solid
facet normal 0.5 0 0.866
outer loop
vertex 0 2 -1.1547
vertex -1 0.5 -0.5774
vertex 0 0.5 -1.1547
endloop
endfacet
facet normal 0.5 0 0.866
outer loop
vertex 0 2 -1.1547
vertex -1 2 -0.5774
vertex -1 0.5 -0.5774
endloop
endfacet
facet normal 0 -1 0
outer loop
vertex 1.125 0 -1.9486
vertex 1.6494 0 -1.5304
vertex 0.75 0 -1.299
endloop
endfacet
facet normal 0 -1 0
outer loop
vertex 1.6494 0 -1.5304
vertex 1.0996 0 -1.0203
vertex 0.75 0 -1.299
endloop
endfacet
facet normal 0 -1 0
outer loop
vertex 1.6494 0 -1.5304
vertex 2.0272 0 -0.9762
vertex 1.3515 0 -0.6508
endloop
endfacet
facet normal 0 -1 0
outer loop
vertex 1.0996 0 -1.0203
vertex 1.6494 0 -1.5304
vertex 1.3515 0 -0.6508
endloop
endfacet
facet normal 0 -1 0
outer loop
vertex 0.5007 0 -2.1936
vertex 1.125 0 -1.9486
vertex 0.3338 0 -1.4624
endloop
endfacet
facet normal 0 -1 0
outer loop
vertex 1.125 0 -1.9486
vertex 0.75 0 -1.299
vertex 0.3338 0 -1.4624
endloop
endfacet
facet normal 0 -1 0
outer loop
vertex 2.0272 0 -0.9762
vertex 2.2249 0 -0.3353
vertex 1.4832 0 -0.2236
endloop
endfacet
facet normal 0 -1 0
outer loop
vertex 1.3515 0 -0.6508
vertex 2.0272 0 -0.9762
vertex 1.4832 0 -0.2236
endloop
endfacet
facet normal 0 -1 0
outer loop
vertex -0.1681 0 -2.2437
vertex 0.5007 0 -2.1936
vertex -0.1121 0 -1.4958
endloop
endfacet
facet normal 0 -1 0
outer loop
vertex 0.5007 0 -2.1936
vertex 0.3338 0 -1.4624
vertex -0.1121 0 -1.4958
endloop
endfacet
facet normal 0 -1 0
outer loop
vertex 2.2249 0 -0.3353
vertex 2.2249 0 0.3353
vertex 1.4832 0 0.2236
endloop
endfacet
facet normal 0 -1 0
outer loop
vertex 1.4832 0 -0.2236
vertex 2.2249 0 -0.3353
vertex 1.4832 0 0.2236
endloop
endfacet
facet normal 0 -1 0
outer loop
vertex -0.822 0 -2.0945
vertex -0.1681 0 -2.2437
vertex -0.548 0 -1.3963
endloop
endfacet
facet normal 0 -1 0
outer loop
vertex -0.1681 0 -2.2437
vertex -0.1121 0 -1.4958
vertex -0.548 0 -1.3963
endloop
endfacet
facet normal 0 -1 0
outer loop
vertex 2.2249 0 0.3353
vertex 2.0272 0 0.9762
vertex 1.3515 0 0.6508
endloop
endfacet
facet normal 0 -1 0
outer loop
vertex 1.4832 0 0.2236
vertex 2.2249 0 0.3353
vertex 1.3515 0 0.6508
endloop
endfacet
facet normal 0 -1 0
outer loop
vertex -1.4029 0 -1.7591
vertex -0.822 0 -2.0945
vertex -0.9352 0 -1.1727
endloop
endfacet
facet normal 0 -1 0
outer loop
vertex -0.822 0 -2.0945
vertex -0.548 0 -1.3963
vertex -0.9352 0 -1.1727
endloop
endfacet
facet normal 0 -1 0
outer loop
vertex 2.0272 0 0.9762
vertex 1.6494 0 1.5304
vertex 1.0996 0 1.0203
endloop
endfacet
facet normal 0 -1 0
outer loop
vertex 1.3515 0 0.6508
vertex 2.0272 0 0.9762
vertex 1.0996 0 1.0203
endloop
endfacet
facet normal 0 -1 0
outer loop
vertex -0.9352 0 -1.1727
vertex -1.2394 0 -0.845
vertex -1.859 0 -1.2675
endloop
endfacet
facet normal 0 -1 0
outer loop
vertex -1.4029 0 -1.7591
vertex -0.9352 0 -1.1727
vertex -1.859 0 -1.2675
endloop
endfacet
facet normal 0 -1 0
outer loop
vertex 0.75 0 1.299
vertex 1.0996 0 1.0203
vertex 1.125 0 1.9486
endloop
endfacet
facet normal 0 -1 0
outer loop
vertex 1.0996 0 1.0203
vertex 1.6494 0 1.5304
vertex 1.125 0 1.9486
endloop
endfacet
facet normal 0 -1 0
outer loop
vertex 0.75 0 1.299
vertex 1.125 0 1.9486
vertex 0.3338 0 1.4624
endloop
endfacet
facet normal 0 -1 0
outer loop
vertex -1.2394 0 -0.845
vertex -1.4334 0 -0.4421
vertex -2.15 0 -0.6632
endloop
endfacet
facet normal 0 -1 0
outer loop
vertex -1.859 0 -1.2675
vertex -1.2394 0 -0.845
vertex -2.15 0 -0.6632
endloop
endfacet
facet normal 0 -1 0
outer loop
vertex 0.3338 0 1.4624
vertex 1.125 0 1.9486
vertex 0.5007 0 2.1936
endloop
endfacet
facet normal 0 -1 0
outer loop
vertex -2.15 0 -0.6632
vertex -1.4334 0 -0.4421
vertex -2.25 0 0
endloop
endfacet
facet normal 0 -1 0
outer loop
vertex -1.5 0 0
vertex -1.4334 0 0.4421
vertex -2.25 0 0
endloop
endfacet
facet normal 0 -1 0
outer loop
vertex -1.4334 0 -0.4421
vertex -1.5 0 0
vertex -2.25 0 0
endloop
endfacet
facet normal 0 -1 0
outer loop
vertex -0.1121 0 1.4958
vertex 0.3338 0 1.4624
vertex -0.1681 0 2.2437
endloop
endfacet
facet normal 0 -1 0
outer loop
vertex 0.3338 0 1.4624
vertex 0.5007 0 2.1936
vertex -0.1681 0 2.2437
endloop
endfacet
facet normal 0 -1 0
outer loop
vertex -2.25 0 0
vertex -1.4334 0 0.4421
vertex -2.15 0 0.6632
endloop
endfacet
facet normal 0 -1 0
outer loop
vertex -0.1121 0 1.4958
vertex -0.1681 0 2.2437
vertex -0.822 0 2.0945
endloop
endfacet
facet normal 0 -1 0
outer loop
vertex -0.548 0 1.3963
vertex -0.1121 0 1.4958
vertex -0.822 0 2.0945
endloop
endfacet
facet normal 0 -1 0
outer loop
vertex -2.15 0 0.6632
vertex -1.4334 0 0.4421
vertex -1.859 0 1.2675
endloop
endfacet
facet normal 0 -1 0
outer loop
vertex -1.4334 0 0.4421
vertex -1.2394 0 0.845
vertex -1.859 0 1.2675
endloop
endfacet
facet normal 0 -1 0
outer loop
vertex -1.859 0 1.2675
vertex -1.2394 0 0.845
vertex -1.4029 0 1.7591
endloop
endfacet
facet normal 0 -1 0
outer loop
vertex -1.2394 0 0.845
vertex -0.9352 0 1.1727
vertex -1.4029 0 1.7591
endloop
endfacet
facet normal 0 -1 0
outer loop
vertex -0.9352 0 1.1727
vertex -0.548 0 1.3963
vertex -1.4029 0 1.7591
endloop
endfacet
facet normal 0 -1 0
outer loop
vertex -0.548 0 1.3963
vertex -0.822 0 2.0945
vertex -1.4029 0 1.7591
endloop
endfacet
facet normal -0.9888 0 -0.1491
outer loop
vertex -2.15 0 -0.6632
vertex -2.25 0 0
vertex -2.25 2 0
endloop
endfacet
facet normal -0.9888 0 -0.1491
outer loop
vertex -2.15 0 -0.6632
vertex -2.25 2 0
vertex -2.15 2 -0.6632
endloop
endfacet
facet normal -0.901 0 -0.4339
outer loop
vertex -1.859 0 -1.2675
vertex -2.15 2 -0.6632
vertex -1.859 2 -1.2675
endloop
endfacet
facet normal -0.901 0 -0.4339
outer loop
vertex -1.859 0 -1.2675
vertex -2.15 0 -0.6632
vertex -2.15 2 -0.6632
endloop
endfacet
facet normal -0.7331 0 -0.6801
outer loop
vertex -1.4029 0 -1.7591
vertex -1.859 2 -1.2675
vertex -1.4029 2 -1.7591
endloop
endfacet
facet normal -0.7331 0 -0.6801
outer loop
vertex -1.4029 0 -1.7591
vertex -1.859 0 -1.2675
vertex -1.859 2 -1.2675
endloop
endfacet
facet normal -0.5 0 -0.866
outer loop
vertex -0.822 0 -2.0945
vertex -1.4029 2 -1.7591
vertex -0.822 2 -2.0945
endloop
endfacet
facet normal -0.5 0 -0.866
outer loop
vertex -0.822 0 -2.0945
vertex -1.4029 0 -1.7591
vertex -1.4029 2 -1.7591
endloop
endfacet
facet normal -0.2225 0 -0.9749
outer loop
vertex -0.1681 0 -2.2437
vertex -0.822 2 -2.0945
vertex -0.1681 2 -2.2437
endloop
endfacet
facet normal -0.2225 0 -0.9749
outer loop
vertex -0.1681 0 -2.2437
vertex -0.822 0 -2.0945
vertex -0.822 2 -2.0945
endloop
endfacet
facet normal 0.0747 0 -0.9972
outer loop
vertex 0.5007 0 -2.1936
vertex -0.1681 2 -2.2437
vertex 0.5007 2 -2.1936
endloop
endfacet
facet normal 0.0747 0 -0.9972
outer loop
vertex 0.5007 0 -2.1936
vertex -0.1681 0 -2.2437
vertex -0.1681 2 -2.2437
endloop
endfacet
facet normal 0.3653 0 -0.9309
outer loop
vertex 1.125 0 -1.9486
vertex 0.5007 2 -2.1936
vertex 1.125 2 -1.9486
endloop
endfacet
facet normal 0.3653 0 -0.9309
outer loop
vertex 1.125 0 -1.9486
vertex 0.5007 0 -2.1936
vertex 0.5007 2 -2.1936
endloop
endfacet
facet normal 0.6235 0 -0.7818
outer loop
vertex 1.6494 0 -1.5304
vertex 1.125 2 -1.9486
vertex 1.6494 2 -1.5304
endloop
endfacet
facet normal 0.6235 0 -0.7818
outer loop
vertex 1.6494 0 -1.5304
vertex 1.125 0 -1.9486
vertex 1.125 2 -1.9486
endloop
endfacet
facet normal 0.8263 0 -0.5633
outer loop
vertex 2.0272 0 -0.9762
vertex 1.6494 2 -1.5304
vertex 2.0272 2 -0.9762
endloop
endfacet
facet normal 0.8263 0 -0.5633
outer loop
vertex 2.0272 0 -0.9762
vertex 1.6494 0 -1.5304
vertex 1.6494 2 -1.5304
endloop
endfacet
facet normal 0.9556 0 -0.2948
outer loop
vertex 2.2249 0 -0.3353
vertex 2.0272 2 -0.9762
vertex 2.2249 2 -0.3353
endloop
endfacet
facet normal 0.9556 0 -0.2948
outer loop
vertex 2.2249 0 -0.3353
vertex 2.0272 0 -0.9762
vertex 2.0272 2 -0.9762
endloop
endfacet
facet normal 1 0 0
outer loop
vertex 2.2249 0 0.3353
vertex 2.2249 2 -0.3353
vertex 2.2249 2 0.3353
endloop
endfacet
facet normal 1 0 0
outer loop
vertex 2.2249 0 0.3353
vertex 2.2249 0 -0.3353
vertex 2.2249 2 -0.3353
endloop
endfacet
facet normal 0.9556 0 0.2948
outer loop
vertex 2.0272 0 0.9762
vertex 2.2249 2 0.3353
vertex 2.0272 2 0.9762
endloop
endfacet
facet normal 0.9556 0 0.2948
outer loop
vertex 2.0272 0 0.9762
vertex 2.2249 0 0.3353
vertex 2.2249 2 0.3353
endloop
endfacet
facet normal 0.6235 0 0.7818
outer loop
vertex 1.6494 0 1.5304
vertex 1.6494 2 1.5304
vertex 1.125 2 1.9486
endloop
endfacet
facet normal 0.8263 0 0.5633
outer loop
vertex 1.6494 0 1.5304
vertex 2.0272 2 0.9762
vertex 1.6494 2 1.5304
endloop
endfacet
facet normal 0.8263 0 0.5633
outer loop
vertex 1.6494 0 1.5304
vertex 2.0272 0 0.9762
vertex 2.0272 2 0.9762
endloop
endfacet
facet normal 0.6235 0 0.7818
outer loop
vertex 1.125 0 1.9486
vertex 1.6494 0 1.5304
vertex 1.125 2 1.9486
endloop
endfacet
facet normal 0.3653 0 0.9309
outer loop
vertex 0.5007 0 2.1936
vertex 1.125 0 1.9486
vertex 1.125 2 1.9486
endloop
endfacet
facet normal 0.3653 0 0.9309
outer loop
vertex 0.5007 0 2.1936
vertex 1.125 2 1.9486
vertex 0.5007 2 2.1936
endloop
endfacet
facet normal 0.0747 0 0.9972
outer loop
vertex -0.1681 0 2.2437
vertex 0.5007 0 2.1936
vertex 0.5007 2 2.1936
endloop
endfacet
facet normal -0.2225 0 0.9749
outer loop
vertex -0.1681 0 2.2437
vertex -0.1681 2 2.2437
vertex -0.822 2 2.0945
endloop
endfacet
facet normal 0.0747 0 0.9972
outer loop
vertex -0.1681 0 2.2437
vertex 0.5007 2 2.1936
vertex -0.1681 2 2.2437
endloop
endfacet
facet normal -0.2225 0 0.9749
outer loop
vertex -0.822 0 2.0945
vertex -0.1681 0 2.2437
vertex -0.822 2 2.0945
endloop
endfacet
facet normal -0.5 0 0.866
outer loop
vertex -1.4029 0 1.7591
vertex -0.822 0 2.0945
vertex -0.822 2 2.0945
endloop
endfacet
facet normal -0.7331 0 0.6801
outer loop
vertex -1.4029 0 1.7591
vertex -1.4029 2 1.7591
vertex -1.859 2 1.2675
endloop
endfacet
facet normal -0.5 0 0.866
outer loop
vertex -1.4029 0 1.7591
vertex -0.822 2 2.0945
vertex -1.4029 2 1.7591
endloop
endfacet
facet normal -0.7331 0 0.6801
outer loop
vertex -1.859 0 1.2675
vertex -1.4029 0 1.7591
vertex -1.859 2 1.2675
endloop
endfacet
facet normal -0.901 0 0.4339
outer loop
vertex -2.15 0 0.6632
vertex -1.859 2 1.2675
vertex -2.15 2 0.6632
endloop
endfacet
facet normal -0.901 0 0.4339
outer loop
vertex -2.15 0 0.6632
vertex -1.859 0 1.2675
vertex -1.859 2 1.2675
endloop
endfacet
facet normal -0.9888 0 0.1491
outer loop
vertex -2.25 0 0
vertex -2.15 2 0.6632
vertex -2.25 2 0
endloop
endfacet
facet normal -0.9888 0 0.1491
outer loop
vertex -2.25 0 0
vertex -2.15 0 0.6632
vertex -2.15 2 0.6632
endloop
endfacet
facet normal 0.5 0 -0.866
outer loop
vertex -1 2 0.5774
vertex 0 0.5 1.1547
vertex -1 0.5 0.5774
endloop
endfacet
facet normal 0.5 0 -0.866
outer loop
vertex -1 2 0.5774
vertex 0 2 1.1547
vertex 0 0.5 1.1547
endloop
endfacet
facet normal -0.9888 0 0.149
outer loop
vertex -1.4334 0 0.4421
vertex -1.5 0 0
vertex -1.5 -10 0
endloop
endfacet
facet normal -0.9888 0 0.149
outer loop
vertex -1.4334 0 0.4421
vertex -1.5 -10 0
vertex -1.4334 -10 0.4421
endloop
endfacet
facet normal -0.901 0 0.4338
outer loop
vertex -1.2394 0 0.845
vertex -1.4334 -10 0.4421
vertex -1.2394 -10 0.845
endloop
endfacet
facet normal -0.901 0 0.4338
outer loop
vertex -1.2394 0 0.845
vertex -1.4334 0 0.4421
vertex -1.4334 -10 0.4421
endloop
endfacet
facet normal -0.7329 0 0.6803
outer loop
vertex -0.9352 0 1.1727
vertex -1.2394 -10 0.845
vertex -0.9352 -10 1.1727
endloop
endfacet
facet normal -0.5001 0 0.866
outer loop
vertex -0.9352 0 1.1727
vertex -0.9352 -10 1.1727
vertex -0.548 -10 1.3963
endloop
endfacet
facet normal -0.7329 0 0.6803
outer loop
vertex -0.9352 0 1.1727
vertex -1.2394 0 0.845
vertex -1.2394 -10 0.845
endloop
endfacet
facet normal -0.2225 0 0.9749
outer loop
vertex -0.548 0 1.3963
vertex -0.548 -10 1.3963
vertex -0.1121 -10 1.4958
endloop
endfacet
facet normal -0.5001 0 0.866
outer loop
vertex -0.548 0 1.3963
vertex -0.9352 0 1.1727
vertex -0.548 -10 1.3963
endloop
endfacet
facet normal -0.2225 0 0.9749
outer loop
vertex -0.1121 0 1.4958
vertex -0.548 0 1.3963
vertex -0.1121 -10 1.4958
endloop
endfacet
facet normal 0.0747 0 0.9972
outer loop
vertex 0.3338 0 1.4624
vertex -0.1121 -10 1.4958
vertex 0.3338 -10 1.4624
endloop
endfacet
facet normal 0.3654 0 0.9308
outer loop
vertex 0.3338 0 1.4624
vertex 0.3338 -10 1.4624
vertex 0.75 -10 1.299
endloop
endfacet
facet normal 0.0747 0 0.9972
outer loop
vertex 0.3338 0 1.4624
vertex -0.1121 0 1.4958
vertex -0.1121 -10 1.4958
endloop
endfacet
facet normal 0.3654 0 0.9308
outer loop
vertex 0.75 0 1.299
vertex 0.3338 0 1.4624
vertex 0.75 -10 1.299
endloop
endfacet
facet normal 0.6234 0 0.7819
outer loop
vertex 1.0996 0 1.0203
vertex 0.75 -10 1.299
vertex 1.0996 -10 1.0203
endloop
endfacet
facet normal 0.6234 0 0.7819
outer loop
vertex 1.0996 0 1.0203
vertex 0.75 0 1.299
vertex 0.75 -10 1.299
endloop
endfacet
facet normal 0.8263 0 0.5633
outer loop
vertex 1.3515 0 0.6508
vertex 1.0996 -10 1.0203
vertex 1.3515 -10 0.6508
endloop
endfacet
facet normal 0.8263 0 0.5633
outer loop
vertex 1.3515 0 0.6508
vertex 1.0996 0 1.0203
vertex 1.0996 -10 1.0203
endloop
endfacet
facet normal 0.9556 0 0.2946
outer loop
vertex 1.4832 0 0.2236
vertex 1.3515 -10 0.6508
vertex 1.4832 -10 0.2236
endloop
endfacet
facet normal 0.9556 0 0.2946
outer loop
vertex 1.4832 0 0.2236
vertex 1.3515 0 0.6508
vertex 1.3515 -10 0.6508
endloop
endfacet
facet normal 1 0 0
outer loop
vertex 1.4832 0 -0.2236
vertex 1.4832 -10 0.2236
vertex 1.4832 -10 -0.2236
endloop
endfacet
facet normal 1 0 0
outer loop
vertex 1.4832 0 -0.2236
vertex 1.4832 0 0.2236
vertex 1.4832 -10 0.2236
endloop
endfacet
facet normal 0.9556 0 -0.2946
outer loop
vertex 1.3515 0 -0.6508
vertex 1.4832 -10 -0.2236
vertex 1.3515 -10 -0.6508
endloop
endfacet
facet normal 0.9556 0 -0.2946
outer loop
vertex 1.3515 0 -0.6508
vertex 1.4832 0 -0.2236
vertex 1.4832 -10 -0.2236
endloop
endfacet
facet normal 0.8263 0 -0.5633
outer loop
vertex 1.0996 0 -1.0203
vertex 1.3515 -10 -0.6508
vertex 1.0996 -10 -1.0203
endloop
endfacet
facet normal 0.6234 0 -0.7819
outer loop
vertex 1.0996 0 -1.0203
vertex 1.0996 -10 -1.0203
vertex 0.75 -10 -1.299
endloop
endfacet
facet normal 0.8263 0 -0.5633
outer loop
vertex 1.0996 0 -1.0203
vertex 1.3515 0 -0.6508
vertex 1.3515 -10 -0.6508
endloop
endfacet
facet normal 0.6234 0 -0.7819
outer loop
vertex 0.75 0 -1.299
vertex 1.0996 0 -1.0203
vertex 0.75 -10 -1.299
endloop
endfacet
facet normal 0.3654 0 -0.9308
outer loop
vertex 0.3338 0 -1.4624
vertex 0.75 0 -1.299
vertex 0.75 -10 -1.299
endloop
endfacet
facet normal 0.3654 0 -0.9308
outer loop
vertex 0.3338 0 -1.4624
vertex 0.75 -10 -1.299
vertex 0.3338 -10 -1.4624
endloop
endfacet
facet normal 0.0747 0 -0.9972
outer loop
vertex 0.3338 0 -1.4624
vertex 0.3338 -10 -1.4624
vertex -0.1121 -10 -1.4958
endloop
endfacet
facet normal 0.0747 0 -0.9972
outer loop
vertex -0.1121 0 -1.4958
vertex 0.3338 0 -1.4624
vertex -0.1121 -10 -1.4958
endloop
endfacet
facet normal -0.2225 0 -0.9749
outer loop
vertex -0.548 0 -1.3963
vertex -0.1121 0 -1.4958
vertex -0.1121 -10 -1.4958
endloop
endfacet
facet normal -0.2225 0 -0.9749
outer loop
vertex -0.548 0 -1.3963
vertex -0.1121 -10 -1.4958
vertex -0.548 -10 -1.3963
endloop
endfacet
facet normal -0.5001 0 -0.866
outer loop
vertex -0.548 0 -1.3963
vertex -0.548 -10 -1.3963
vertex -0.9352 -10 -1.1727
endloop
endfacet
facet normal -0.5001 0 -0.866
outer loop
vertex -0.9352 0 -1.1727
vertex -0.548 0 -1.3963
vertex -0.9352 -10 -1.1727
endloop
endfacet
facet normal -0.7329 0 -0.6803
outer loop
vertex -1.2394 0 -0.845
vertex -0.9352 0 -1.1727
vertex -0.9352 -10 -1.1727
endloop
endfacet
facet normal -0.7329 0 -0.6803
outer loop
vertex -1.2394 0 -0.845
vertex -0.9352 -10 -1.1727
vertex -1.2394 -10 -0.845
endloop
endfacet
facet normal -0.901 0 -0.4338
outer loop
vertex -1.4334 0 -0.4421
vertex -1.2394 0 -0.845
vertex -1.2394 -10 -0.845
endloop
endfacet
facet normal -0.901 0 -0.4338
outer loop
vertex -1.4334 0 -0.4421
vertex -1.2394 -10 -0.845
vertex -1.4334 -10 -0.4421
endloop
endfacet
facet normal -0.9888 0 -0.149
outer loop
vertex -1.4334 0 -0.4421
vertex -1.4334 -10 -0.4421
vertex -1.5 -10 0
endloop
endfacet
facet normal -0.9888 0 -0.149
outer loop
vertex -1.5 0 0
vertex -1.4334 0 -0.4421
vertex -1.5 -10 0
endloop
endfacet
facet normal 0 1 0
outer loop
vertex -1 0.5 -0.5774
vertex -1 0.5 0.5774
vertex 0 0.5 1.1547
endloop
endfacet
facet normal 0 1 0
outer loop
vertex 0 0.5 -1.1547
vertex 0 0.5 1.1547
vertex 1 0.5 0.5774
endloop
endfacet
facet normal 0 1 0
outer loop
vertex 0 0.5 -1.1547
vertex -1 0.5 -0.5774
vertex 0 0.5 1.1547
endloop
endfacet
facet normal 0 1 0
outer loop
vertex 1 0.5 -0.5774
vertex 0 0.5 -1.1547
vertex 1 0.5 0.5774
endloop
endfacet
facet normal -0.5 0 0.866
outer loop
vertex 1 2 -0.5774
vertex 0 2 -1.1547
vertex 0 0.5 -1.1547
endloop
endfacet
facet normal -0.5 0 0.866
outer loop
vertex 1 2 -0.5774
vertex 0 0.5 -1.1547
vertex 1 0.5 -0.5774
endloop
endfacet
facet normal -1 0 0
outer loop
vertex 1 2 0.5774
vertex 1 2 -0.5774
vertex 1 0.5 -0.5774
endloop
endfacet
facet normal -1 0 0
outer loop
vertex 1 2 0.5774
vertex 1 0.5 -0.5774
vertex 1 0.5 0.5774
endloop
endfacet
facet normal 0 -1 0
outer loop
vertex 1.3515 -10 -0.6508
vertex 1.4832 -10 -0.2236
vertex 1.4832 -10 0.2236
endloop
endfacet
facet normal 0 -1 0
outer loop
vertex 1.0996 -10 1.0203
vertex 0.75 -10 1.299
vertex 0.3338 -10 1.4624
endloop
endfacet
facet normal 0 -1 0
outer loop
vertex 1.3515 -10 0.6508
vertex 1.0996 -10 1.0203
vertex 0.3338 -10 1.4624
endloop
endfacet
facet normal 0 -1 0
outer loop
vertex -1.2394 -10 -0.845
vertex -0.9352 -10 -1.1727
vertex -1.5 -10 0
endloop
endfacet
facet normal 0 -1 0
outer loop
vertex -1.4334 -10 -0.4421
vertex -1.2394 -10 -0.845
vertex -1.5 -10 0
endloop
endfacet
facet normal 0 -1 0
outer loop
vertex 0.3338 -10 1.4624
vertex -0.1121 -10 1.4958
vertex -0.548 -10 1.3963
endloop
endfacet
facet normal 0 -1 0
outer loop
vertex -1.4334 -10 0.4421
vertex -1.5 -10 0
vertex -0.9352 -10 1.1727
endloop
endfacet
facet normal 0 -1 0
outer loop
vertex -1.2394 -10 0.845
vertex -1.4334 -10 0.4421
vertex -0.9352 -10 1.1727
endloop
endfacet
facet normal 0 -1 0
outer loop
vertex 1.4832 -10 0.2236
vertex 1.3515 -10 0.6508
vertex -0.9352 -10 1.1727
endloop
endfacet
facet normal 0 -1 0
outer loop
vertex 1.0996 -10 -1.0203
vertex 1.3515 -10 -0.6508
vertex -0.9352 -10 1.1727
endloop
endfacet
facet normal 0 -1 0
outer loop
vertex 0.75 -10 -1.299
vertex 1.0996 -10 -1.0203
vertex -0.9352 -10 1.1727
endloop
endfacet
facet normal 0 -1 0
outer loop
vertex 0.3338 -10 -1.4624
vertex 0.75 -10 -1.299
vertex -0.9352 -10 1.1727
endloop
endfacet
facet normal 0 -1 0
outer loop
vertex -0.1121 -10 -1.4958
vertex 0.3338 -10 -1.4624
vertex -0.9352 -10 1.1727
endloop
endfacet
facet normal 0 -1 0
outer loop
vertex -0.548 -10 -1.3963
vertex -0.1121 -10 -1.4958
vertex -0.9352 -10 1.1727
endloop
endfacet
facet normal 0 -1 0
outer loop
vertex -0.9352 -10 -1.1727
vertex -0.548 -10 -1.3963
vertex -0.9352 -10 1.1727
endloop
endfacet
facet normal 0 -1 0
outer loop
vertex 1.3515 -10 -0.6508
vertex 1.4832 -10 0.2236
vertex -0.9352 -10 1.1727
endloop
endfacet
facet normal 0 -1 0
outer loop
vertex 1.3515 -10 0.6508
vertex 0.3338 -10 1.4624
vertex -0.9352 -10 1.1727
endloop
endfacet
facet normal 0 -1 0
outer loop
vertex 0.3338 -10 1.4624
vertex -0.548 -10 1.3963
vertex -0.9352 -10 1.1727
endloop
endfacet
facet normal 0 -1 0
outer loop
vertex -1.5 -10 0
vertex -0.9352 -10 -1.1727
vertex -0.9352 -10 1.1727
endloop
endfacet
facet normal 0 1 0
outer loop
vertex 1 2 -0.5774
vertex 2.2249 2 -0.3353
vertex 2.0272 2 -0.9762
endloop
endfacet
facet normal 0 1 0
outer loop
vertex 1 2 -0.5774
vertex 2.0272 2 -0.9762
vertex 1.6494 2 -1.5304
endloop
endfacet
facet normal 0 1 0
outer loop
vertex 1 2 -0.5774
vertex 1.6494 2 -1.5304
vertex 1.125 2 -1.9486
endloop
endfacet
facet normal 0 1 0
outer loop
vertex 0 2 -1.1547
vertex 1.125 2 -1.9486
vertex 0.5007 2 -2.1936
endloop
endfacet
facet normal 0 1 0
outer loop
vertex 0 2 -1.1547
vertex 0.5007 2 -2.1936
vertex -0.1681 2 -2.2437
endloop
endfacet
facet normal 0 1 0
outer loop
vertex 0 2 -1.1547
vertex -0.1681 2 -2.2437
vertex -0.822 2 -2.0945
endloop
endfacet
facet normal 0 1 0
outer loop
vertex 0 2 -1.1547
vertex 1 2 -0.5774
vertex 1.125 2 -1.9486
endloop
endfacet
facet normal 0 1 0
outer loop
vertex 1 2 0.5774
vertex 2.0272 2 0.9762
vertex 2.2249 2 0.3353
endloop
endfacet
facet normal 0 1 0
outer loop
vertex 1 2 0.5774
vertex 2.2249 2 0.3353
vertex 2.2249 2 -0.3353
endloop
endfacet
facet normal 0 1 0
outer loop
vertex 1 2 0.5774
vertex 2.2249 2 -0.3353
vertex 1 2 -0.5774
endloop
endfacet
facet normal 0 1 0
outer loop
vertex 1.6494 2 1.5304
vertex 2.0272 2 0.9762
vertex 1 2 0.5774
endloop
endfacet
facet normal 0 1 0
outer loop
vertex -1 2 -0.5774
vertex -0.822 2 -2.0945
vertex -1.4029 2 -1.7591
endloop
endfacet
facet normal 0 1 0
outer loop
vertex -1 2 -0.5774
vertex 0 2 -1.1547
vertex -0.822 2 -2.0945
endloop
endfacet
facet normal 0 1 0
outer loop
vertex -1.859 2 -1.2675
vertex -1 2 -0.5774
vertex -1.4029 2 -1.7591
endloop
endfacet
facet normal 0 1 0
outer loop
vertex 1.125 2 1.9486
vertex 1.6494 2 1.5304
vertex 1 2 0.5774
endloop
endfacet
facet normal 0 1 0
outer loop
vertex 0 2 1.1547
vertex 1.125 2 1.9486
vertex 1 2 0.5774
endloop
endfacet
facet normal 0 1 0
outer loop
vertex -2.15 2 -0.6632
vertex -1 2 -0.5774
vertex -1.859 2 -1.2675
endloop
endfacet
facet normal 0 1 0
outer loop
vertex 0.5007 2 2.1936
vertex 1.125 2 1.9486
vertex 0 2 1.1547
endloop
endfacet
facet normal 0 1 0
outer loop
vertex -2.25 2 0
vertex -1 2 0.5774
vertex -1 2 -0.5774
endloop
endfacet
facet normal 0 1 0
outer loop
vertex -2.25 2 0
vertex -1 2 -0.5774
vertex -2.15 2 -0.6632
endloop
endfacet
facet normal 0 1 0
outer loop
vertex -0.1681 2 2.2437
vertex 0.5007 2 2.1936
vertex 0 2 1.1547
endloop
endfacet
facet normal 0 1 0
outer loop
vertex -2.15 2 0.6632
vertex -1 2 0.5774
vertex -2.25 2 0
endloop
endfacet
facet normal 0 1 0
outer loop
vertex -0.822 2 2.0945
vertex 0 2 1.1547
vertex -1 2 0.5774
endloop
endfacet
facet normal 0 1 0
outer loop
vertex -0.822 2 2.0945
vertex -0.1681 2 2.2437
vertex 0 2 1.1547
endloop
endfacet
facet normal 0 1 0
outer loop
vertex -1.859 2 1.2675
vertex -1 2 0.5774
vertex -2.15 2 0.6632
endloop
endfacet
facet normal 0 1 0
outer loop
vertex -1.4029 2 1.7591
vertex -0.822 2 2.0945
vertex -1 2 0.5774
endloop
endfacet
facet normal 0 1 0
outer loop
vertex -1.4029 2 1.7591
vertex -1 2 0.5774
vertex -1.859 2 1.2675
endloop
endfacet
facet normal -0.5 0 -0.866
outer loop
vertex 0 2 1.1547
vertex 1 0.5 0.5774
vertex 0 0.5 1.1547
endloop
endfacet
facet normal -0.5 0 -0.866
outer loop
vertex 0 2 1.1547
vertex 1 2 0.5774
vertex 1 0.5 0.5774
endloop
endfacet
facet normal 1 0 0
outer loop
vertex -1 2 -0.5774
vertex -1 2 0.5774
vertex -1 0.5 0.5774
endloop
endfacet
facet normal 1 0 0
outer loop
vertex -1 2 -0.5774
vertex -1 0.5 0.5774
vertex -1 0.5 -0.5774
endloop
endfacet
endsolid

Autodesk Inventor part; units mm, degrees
ref_plane "YZ Plane" through (0, 0, 0) normal (1, 0, 0) x (0, 1, 0)
ref_plane "XZ Plane" through (0, 0, 0) normal (0, 1, 0) x (-1, 0, 0)
ref_plane "XY Plane" through (0, 0, 0) normal (0, 0, 1) x (1, 0, 0)
sketch "Sketch1" plane through (0, 0, 0) normal (0, 1, 0) x (-1, 0, 0)
  circle A0 centre (0, 0) radius 2.25
  circle A1 centre (0, 0) radius 1.5
  dimension "d0" = 4.5
  dimension "d1" = 3
extrude "Extrusion1" add sketch "Sketch1" against normal blind 10 contours A1
extrude "Extrusion2" add sketch "Sketch1" along normal blind 2 contours A0 | A1
sketch "Sketch2" plane through (0, 2, 0) normal (0, 1, 0) x (1, 0, 0)
  circle A0 centre (0, 0) radius 1.5 projected
  line L0 (-1, -0.5774) -> (-1, 0.5774)
  line L1 (-1, 0.5774) -> (0, 1.1547)
  line L2 (0, 1.1547) -> (1, 0.5774)
  line L3 (1, 0.5774) -> (1, -0.5774)
  line L4 (1, -0.5774) -> (0, -1.1547)
  line L5 (0, -1.1547) -> (-1, -0.5774)
  dimension "d6" = 2
extrude "Extrusion3" cut sketch "Sketch2" against normal blind 1.5 contours L0 L1 L2 L3 L4 L5
equation "\"d0\" = D_"
equation "\"d1\" = M_"
equation "\"d2\" = L_"
equation "\"d4\" = K_"
equation "\"d6\" = S_"
equation "\"d7\" = t_"
equation "\"K_\" = 2"
equation "\"D_\" = 4.5"
equation "\"S_\" = 2"
equation "\"t_\" = 1.5"
equation "\"M_\" = 3"
equation "\"L_\" = 10"
properties part number "M3 x 10" material "Stainless Steel"
